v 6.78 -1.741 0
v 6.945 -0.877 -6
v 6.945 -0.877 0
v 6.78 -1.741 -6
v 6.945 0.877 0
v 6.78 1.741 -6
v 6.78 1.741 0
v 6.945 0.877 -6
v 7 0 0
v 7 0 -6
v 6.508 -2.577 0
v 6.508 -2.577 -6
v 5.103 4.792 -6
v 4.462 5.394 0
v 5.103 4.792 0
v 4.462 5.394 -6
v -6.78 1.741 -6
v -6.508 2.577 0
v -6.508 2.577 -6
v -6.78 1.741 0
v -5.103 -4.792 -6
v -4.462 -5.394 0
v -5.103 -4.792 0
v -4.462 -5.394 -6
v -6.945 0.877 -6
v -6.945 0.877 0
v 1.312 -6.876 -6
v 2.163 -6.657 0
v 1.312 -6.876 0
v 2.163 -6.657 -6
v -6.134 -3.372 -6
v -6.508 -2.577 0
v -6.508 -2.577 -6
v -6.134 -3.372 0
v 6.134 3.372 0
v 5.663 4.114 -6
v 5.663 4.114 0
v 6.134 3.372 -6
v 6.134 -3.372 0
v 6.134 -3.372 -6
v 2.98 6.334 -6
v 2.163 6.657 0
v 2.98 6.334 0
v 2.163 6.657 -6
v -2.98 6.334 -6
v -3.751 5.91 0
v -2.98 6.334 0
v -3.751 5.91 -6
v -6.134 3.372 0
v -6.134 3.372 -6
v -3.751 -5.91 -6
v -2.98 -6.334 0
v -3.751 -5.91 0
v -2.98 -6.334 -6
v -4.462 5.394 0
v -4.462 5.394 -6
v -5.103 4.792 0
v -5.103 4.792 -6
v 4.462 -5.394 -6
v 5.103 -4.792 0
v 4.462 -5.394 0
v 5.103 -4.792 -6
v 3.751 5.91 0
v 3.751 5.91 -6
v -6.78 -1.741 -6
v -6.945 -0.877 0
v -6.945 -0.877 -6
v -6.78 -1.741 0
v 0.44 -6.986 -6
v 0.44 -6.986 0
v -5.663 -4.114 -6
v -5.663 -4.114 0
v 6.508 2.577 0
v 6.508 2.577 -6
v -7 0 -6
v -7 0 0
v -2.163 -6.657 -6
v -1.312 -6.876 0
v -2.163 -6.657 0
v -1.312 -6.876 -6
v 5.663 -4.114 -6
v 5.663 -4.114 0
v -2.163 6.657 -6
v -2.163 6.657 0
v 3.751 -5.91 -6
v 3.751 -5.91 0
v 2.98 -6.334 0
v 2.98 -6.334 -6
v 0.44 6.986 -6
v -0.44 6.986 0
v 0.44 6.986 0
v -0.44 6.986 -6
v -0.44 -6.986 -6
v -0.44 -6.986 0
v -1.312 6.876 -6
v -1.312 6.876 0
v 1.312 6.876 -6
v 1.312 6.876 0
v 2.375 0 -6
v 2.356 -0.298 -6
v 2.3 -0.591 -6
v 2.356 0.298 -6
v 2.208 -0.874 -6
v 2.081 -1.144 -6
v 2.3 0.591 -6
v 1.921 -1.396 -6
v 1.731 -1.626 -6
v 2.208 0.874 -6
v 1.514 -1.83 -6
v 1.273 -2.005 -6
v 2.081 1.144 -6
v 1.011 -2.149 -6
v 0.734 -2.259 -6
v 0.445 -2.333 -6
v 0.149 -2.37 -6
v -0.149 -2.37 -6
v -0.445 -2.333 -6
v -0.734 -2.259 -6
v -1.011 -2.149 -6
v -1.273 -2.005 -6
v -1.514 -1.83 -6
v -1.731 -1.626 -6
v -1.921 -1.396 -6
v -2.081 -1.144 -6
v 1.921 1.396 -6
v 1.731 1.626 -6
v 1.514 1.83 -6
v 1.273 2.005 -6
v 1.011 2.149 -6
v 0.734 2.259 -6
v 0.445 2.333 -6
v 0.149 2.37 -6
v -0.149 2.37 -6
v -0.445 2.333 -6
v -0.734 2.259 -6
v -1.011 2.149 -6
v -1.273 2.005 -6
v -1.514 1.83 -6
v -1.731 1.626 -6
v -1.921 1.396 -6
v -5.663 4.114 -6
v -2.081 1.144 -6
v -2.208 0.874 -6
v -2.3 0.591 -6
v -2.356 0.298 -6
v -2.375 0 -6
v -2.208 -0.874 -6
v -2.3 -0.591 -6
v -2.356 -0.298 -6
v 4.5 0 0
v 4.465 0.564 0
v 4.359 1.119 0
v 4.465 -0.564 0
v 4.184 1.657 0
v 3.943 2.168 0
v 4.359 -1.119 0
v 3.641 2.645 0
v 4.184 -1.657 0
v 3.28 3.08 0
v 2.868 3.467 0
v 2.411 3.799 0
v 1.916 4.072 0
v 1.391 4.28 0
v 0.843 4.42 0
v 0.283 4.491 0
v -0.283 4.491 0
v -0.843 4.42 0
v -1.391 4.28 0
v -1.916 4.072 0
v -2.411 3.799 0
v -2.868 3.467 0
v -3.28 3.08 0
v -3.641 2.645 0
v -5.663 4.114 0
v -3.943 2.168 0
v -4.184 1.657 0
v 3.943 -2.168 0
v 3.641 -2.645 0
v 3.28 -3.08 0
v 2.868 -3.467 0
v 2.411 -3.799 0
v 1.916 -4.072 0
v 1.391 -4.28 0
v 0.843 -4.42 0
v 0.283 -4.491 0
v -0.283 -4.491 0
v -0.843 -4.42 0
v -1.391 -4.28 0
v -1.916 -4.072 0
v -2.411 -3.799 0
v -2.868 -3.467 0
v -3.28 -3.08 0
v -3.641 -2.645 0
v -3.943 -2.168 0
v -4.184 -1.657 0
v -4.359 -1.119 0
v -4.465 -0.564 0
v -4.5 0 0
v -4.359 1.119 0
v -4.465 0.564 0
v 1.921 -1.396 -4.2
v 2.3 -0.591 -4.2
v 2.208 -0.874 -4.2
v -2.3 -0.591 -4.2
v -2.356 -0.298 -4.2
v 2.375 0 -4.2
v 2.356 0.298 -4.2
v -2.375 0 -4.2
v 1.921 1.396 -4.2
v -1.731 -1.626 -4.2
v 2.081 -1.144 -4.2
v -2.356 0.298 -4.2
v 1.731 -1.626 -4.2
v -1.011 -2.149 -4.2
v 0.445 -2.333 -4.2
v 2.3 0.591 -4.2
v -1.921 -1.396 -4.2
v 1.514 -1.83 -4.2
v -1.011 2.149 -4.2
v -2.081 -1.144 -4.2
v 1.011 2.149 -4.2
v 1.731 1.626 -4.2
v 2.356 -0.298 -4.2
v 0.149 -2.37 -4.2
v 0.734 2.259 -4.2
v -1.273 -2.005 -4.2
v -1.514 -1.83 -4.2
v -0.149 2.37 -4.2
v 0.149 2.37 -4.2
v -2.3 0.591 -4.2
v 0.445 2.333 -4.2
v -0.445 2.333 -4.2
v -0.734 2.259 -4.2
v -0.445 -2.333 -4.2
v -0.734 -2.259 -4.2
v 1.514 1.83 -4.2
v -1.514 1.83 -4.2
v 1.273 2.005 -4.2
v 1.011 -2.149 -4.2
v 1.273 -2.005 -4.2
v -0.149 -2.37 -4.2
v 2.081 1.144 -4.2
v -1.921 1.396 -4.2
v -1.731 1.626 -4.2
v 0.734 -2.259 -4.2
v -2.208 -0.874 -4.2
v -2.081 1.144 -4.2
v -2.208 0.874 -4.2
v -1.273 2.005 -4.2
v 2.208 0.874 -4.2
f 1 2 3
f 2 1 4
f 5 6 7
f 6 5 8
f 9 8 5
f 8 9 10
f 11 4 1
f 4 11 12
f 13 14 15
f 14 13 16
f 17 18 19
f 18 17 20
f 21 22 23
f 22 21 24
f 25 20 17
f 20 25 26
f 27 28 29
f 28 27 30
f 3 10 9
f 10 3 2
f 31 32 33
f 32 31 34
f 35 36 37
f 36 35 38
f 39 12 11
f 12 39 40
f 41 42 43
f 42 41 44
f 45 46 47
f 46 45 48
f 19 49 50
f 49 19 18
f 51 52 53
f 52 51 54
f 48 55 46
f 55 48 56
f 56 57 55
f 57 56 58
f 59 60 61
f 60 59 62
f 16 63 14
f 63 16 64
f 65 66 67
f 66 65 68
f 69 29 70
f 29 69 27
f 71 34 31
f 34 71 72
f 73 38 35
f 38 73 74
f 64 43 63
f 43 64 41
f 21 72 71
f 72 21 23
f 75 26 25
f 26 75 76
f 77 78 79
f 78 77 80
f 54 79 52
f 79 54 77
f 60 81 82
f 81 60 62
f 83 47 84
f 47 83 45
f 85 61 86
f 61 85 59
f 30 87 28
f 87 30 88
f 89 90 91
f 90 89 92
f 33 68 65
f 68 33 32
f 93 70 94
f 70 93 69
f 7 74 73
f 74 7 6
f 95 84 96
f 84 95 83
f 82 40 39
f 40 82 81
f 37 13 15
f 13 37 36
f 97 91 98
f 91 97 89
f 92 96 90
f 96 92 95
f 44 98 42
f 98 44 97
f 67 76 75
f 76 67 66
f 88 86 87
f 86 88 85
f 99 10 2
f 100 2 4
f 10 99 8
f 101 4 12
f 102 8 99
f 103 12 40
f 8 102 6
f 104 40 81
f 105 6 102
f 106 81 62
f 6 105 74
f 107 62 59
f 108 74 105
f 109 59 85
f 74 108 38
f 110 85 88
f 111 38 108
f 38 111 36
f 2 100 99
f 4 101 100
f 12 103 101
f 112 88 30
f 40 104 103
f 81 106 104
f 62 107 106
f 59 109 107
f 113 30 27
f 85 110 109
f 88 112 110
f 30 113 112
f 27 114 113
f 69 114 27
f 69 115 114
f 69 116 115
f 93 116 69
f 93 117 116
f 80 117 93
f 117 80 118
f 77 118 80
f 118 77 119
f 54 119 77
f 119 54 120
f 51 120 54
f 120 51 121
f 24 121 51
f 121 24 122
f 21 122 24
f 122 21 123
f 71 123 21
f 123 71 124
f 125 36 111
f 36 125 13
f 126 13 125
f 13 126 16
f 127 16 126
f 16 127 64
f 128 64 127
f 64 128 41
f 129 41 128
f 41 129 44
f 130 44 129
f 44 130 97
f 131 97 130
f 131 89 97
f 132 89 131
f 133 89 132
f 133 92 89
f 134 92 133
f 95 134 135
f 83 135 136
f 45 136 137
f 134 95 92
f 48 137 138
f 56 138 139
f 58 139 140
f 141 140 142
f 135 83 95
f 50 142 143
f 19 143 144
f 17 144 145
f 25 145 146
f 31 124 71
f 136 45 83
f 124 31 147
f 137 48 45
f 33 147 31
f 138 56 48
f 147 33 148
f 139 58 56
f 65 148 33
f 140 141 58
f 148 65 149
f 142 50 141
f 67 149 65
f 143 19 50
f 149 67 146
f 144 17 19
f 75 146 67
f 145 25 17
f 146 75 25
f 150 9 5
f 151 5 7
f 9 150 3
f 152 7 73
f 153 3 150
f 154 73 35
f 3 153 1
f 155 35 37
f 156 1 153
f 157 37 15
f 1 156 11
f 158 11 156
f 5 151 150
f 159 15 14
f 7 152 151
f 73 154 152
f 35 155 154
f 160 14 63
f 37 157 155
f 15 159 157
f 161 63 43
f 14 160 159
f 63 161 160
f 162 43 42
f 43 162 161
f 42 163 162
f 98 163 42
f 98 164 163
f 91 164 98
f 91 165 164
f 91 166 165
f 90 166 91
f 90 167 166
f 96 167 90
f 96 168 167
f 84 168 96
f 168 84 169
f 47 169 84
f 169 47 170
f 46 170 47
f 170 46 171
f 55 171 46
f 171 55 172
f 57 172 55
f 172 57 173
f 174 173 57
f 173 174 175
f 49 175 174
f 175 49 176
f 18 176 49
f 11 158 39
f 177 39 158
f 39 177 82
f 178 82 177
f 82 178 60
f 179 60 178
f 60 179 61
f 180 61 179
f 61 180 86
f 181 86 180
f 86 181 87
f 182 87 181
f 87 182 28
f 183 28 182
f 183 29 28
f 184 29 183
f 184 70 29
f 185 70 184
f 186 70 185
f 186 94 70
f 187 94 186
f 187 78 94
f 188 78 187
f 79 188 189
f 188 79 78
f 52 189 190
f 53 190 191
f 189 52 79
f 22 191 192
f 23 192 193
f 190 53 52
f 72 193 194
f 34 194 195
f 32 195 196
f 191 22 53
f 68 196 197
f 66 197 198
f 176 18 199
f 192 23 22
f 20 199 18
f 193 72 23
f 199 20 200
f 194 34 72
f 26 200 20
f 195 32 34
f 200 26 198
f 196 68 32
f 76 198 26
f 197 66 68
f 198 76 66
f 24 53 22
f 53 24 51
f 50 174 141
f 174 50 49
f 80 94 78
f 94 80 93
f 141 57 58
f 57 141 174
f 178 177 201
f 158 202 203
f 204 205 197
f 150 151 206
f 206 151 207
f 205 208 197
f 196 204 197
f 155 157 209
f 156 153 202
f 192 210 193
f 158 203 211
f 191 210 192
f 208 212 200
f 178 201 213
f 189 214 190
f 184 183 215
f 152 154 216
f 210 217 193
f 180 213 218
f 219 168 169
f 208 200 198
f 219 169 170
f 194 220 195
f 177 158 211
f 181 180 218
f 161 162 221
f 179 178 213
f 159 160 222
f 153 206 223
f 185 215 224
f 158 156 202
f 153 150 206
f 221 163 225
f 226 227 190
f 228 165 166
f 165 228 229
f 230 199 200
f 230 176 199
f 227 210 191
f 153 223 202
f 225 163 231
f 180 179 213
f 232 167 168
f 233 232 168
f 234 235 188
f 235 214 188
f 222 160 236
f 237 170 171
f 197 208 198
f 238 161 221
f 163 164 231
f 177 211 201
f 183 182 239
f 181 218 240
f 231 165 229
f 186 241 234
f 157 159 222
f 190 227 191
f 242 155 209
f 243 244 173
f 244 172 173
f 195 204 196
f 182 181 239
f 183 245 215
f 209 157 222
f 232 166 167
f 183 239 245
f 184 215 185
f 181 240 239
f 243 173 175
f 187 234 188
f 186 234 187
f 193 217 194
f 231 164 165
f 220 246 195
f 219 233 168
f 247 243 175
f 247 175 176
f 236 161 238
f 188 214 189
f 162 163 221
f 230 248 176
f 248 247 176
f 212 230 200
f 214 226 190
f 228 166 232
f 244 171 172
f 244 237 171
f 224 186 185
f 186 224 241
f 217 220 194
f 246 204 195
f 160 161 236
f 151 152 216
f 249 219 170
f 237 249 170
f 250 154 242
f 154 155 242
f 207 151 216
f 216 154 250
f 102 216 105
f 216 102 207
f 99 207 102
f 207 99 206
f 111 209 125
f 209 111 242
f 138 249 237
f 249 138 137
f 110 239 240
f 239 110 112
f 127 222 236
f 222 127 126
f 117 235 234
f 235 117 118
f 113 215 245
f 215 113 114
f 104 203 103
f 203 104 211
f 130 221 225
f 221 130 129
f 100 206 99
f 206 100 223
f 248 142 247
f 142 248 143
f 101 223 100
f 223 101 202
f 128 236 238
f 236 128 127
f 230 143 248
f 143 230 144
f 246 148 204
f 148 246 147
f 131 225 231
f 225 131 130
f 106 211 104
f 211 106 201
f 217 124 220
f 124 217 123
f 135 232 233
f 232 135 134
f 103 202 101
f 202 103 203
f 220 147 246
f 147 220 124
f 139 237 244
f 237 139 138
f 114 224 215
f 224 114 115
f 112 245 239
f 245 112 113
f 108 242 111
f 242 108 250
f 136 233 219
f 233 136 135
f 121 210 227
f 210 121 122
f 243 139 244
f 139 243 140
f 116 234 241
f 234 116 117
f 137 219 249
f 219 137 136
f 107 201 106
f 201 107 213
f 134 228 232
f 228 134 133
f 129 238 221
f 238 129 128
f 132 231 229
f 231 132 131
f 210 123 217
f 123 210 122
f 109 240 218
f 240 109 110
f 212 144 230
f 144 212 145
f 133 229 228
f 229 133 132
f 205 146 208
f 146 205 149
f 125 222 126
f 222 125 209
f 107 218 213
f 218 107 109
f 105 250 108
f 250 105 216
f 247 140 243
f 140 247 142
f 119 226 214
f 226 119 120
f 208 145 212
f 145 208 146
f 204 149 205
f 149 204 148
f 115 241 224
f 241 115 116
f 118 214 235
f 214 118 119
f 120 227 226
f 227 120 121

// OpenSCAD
$fn = 50;


difference() {
	union() {
		translate(v = [0, 0, -6.0000000000]) {
			cylinder(h = 6, r = 7.0000000000);
		}
		translate(v = [0, 0, -6.0000000000]) {
			cylinder(h = 6, r = 2.8750000000);
		}
	}
	union() {
		translate(v = [0, 0, 0]) {
			rotate(a = [0, 0, 0]) {
				difference() {
					union() {
						translate(v = [0, 0, -6.0000000000]) {
							cylinder(h = 6, r = 2.2500000000);
						}
						translate(v = [0, 0, -4.2000000000]) {
							cylinder(h = 4.2000000000, r1 = 2.3750000000, r2 = 4.5000000000);
						}
						translate(v = [0, 0, -6.0000000000]) {
							cylinder(h = 6, r = 2.3750000000);
						}
						translate(v = [0, 0, -6.0000000000]) {
							cylinder(h = 6, r = 2.2500000000);
						}
					}
					union();
				}
			}
		}
	}
}
